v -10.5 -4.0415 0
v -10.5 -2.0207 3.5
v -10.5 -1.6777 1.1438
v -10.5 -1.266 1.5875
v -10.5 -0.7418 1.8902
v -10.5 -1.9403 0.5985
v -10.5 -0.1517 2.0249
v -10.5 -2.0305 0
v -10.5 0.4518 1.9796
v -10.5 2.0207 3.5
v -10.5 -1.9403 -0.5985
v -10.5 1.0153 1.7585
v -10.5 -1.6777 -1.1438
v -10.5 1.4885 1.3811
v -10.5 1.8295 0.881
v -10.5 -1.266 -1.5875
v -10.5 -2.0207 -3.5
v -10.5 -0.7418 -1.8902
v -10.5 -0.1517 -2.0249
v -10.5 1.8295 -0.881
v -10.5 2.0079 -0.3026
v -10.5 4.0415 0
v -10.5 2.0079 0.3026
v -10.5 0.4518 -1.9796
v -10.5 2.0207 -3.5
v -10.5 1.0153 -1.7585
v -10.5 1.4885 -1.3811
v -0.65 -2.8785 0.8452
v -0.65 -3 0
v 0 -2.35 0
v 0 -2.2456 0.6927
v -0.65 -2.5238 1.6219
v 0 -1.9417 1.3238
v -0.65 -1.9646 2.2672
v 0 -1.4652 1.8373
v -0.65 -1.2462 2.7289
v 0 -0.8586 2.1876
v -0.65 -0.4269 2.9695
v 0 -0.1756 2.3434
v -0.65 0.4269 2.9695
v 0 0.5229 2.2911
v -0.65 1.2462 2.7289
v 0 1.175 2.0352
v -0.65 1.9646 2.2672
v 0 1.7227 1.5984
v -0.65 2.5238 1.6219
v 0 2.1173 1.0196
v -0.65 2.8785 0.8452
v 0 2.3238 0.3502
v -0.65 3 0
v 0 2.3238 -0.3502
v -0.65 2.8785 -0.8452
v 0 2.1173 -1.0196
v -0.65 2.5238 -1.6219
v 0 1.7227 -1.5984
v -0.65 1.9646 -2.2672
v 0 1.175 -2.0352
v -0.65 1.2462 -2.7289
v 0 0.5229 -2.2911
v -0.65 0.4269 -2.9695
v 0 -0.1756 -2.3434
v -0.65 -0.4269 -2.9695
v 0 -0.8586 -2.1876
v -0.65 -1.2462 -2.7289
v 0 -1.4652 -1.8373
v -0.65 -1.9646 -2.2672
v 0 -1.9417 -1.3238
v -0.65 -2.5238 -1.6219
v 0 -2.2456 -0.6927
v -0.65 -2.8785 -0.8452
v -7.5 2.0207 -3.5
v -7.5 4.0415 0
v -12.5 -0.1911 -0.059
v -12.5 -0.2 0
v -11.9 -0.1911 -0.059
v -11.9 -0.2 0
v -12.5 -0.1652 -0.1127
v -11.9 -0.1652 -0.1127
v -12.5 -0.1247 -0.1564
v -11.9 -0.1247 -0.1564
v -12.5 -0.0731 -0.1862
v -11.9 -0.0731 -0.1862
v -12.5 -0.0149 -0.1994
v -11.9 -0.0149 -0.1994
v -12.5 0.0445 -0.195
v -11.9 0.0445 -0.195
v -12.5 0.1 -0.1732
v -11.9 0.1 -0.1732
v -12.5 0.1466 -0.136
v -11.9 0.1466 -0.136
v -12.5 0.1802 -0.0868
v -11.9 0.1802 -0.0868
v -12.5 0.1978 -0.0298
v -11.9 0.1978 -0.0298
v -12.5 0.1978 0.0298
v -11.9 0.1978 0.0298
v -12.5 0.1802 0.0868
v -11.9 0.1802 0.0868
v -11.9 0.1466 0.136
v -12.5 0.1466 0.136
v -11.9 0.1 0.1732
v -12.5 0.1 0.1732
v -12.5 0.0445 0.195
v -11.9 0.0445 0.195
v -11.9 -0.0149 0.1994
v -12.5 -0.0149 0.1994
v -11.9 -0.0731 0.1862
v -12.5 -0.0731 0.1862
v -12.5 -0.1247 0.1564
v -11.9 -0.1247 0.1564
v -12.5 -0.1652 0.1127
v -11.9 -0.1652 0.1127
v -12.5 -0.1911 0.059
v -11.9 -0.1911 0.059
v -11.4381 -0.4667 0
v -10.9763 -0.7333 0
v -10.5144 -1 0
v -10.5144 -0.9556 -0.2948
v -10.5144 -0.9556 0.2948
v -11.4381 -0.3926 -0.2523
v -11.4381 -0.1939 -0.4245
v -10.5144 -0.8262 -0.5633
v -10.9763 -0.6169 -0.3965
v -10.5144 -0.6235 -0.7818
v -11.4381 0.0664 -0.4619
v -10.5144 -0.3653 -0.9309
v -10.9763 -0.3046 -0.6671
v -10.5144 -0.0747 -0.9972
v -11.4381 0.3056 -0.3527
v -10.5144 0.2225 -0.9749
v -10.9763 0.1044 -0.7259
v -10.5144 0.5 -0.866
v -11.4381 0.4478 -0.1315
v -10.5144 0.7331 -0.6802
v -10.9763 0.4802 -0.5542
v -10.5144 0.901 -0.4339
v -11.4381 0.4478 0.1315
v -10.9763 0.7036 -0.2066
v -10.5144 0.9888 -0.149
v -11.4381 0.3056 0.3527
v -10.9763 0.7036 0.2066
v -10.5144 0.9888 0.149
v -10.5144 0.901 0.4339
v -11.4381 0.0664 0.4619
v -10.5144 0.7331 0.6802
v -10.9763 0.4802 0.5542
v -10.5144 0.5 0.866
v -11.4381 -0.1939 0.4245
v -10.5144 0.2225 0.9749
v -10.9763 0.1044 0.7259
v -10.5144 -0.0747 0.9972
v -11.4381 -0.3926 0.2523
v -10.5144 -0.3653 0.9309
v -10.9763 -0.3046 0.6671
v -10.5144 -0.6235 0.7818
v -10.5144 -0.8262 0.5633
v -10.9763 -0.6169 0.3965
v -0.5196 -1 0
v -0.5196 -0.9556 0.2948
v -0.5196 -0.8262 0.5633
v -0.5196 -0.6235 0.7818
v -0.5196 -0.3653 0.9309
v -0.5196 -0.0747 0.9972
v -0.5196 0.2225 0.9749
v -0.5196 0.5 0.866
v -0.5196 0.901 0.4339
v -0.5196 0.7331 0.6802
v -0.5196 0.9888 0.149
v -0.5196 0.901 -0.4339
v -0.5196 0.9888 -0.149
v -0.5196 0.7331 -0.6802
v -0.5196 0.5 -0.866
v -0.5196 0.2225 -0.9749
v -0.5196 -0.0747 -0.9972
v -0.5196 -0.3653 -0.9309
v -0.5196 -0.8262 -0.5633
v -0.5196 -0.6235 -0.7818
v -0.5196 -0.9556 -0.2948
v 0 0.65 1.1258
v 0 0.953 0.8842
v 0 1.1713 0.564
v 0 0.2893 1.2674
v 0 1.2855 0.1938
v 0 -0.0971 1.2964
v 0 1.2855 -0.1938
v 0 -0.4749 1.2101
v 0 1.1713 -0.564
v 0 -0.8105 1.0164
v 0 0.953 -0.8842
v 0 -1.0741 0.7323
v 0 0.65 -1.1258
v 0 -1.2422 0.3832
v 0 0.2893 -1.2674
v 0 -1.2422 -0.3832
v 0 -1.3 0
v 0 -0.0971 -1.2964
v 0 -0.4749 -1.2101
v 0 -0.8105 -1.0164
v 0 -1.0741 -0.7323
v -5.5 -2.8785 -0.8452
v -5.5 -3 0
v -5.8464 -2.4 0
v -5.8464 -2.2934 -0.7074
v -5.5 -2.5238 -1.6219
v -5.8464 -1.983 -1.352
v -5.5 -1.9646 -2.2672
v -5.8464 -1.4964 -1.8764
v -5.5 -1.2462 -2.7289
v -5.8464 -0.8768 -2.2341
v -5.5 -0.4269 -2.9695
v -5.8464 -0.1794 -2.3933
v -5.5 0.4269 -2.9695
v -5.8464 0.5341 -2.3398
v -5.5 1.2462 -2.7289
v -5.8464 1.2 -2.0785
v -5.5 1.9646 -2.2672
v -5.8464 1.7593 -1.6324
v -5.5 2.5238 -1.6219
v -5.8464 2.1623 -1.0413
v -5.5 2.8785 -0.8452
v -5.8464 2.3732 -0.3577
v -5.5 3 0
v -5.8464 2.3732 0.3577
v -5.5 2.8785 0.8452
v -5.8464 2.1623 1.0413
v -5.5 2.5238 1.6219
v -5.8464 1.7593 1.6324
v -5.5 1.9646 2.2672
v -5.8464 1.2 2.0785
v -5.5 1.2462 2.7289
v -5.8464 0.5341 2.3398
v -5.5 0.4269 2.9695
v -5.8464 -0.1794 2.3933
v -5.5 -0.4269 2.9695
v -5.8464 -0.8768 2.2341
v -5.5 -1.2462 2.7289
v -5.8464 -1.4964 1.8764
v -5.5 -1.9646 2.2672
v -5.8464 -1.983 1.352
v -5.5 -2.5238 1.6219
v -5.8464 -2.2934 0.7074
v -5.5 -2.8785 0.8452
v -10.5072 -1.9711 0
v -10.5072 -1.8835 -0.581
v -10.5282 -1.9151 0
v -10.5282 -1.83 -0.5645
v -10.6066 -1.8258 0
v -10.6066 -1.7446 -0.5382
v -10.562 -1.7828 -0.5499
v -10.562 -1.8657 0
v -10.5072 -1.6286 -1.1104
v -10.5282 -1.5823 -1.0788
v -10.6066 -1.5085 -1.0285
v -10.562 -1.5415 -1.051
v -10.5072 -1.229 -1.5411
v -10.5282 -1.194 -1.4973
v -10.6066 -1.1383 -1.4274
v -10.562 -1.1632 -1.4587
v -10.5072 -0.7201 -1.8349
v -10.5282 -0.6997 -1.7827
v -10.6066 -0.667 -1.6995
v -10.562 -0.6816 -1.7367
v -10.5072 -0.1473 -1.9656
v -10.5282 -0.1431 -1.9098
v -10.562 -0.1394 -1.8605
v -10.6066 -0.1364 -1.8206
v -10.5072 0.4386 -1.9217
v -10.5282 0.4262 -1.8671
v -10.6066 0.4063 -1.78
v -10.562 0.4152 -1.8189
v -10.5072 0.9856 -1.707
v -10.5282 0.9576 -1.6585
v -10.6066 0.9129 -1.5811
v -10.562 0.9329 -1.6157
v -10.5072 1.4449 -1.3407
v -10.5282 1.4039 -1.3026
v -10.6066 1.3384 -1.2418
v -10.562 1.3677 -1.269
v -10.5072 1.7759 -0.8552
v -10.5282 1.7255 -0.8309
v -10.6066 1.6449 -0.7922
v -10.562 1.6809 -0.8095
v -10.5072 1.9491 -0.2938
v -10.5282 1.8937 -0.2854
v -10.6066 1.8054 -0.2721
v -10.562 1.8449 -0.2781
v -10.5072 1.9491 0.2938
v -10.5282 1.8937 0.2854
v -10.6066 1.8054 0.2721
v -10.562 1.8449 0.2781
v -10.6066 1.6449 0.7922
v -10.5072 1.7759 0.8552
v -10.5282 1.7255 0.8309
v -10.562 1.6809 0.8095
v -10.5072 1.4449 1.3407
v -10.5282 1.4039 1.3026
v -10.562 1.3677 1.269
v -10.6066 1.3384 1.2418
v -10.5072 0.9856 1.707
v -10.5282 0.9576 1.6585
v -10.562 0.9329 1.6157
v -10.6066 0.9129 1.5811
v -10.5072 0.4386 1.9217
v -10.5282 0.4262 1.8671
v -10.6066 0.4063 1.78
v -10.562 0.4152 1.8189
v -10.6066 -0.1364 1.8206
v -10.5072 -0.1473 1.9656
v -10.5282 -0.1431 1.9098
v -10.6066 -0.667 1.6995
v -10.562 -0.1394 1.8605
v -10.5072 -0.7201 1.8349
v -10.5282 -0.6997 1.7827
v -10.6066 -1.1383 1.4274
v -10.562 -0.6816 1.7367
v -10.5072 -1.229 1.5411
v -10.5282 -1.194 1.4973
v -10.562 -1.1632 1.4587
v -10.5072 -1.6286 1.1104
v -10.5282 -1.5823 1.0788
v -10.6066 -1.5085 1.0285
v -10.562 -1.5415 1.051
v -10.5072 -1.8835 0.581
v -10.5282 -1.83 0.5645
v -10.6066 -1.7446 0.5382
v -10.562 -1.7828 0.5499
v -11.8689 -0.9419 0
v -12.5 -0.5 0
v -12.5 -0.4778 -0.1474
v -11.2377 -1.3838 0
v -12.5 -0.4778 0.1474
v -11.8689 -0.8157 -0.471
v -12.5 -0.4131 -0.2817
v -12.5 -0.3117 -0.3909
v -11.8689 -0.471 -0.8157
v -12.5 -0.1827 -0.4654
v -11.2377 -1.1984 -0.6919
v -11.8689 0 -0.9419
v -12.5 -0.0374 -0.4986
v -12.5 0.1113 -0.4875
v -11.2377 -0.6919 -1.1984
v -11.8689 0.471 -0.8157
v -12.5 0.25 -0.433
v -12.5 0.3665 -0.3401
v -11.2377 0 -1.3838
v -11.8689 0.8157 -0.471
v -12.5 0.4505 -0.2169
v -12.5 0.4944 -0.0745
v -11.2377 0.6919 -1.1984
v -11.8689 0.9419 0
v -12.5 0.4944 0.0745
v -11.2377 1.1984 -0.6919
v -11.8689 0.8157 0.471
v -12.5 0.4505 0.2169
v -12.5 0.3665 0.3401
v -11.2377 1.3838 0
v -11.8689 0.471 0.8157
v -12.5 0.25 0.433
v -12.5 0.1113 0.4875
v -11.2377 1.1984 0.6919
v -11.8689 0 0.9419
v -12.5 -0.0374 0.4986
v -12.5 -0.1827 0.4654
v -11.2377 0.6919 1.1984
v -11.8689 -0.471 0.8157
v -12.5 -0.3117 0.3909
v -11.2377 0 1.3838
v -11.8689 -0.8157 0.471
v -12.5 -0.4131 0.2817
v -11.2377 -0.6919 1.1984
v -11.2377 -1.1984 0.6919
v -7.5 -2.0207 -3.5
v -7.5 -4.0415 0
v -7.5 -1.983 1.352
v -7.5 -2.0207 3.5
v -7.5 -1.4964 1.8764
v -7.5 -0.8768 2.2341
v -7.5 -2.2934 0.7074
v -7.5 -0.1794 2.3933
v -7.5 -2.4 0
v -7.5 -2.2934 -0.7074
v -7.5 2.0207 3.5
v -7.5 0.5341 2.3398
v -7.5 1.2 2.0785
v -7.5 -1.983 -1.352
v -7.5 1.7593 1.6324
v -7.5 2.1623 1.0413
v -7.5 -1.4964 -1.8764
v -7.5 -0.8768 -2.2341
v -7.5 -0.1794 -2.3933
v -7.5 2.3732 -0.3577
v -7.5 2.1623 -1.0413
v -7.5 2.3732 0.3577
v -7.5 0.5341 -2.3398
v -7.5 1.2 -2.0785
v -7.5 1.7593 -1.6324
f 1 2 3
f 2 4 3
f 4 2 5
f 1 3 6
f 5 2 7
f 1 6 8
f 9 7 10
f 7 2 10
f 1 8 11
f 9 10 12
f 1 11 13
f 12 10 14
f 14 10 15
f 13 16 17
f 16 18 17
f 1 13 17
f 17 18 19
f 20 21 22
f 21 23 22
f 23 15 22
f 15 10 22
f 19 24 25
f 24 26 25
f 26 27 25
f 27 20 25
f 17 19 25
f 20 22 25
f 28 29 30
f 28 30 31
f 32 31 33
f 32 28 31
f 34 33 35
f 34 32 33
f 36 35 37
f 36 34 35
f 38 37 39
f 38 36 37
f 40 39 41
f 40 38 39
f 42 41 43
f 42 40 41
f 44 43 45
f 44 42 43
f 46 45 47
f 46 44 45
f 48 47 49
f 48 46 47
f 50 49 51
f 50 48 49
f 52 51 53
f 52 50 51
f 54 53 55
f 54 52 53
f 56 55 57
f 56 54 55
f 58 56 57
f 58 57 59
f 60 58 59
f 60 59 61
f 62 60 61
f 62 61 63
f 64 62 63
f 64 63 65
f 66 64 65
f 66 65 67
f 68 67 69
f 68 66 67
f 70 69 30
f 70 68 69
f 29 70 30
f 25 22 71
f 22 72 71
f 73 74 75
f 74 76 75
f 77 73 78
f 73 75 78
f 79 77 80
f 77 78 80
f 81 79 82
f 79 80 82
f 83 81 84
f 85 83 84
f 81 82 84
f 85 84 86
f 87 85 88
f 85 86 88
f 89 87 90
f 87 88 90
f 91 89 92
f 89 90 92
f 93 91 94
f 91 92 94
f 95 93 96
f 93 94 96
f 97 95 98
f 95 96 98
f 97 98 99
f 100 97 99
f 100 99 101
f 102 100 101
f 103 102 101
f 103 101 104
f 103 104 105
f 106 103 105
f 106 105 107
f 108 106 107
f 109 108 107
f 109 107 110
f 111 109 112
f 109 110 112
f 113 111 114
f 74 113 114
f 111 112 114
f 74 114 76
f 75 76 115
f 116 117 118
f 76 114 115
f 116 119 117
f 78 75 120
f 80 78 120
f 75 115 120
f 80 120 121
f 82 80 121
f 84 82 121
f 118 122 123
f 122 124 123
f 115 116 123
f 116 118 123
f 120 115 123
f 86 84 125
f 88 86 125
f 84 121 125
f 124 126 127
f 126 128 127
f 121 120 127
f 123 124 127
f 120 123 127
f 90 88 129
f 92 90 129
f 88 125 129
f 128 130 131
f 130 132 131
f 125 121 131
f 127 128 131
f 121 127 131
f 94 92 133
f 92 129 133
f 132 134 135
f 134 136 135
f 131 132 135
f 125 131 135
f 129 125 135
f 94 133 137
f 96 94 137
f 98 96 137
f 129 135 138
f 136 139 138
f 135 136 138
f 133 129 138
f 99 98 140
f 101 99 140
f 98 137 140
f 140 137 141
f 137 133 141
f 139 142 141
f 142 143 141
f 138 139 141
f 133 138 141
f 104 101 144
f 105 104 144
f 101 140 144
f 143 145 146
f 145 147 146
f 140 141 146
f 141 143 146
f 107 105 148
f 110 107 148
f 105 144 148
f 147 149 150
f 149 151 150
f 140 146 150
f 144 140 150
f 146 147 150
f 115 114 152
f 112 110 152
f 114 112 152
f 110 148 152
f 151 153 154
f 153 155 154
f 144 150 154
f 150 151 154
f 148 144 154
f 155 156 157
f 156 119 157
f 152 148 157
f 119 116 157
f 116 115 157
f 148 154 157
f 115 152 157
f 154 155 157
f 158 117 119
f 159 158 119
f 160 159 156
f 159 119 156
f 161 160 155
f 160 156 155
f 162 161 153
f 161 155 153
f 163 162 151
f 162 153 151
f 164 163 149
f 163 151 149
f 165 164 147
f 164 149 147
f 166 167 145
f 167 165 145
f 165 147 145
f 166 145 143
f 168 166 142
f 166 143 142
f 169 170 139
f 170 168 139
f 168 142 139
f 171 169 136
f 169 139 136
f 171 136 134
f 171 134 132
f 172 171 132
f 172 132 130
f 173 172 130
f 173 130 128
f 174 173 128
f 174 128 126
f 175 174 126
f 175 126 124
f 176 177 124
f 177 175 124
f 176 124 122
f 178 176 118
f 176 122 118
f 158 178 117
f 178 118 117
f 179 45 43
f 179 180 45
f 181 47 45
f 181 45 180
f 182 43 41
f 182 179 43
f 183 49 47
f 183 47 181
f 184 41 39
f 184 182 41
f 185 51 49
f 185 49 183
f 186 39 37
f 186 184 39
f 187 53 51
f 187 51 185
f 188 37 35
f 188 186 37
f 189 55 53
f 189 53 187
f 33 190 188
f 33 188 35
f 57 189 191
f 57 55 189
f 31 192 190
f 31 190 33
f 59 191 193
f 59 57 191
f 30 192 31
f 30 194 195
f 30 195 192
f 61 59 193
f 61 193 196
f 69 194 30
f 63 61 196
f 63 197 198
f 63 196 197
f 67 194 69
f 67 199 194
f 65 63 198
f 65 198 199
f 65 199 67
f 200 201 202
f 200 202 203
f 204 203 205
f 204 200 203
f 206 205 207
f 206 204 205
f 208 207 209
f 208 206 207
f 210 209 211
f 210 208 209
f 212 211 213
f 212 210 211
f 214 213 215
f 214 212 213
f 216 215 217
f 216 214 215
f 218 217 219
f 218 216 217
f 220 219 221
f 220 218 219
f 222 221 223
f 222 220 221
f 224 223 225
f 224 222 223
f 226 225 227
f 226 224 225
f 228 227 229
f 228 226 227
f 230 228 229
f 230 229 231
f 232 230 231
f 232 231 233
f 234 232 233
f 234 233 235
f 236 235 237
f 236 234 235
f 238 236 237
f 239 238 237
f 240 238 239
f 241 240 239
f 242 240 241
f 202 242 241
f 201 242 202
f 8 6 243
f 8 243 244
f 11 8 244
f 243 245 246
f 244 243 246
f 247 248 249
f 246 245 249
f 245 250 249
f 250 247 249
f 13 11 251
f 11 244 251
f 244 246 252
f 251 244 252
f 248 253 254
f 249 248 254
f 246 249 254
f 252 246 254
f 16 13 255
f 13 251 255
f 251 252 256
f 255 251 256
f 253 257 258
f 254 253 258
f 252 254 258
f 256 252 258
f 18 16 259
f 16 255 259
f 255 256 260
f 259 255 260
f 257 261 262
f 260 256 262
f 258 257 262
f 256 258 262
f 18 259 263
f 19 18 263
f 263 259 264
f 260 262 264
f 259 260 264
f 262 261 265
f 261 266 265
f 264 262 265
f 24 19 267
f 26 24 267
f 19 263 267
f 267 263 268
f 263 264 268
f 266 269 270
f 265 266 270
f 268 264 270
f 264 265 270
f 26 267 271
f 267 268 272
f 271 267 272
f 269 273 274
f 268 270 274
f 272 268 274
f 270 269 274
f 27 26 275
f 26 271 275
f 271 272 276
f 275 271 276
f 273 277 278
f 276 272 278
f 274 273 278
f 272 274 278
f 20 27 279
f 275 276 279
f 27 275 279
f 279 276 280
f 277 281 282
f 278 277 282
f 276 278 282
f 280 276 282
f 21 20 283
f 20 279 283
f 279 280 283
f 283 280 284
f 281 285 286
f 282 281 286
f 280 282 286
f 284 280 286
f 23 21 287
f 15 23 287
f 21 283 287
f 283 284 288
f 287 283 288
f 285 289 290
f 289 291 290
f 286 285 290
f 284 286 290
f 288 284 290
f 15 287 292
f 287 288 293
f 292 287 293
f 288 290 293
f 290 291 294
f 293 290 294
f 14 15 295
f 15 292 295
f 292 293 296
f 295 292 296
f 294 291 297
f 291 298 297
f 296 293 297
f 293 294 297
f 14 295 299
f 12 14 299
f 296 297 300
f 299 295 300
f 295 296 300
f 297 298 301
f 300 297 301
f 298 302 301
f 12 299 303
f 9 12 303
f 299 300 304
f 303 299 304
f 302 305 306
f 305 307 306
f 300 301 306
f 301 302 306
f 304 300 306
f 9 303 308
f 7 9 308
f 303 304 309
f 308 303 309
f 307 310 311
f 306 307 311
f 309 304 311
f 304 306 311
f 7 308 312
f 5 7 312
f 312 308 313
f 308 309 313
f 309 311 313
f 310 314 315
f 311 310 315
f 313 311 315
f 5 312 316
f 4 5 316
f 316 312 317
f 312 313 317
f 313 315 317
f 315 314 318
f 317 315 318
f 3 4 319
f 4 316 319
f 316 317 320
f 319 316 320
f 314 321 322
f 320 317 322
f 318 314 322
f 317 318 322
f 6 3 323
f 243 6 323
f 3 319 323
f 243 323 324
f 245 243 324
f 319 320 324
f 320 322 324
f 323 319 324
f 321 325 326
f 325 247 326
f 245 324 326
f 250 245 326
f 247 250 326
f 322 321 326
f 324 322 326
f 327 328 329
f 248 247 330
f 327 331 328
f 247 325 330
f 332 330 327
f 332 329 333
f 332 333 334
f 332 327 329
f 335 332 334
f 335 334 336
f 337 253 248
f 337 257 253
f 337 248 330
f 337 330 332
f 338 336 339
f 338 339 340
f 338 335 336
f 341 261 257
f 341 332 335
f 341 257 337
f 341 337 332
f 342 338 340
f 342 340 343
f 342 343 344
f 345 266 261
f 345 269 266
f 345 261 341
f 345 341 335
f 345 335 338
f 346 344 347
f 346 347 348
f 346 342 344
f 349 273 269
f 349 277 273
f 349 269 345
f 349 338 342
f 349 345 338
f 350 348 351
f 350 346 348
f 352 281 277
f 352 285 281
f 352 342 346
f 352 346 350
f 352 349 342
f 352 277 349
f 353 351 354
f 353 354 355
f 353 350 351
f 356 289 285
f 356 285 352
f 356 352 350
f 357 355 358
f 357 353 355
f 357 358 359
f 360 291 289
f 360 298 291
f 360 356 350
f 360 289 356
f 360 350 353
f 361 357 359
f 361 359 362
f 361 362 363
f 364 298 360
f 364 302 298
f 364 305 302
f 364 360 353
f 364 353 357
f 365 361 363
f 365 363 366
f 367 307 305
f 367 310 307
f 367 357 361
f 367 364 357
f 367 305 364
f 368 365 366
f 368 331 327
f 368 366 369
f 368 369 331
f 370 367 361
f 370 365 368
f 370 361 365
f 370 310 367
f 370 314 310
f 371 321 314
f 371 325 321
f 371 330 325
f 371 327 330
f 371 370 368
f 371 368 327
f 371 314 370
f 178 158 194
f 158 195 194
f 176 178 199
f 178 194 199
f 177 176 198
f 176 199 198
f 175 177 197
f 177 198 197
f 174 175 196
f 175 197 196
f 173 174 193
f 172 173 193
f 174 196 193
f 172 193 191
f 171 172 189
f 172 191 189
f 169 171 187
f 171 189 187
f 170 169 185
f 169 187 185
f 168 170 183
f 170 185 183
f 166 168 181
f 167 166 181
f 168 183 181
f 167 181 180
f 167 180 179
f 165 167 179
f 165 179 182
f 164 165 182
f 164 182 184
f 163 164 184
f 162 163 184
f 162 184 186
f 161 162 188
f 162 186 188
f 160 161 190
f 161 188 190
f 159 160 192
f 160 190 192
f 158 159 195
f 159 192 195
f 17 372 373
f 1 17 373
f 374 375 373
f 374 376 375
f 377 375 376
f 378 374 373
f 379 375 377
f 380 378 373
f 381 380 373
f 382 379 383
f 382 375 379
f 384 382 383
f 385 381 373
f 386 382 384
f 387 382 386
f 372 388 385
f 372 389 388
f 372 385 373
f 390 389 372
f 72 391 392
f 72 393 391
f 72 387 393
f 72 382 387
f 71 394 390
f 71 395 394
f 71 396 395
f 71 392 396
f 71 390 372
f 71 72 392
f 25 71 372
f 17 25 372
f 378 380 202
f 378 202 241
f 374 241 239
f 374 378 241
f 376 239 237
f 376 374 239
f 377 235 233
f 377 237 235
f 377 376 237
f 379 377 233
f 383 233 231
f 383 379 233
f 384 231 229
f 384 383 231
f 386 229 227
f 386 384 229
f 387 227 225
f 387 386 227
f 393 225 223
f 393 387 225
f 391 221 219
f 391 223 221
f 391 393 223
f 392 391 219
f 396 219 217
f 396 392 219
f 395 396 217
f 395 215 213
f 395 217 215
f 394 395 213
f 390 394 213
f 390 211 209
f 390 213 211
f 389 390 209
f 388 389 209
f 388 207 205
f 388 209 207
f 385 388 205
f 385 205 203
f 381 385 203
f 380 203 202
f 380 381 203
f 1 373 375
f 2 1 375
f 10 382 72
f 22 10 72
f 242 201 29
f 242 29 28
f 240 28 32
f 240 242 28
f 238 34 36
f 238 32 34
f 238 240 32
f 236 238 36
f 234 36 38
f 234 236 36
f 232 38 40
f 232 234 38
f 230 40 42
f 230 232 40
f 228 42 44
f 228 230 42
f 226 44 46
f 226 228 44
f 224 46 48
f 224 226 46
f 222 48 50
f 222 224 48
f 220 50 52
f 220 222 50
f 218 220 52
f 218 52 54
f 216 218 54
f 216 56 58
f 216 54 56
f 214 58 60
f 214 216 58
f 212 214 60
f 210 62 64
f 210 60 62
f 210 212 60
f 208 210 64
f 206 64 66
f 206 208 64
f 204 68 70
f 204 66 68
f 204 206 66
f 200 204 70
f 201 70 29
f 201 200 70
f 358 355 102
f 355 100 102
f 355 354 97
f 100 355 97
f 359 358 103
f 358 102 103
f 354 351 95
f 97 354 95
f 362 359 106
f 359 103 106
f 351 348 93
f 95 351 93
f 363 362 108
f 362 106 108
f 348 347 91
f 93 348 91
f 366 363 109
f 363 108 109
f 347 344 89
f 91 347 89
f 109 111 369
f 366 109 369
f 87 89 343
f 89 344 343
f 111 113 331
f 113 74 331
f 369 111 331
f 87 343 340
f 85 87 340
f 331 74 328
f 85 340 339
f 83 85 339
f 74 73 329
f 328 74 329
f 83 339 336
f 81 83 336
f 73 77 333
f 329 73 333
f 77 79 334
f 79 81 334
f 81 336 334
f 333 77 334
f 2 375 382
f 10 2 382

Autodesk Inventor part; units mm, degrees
ref_plane "YZ Plane" through (0, 0, 0) normal (1, 0, 0) x (0, 1, 0)
ref_plane "XZ Plane" through (0, 0, 0) normal (0, 1, 0) x (-1, 0, 0)
sketch "Náčrt1" plane through (0, 0, 0) normal (0, 0, 1) x (1, 0, 0)
  line L0 (0, -3.6) -> (0, 0.6) projected
  line L1 (-15, 0) -> (2.5, 0) projected
  line L2 (-0.5196, -1) -> (-10.5144, -1)
  line L3 (0, -1.3) -> (0, -3)
  line L4 (0, -3) -> (-5.5, -3)
  line L5 (-5.5, -3) -> (-6.1348, -1.9004)
  line L6 (-6.1348, -1.9004) -> (-10.5, -1.9004)
  line L7 (-10.5, -1.9004) -> (-12.5, -0.5)
  line L8 (-12.5, -0.5) -> (-12.5, -0.2)
  line L9 (-12.5, -0.2) -> (-11.9, -0.2)
  line L10 (-11.9, -0.2) -> (-10.5144, -1)
  line L11 (-0.5196, -1) -> (0, -1.3)
  line L12 (-5.8464, -2.4) -> (-7.5, -2.4)
  line L13 (-7.5, -2.4) -> (-7.5, -1.9004)
  point P0 (0, 0)
  dimension "d0" = 6
  dimension "d1" = 0.4
  dimension "d3" = 1
  dimension "d4" = 12.5
  dimension "d5" = 10.5
  dimension "d6" = 2
  dimension "d7" = 30
  dimension "d9" = 5.5
  dimension "d10" = 120
  dimension "d36" = 0.6
  dimension "d37" = 35
  dimension "d38" = 2.6
  dimension "d39" = 30
  dimension "d40" = 4.8
  dimension "d41" = 5
revolve "Rotace1" add sketch "Náčrt1" angle 360 about axis through (-10, 0, 0) along (1, 0, 0) contours L4 L5 L6 L7 L8 L9 L10 L2 L11 L0
ref_plane "Pracovní rovina1" through (-7.5, 0, 0) normal (1, 0, 0) x (0, 0, -1)
sketch "Náčrt2" plane through (-7.5, 0, 0) normal (1, 0, 0) x (0, 0, -1)
  line L0 (0, 4.0415) -> (3.5, 2.0207)
  line L1 (3.5, 2.0207) -> (3.5, -2.0207)
  line L2 (3.5, -2.0207) -> (0, -4.0415)
  line L3 (0, -4.0415) -> (-3.5, -2.0207)
  line L4 (-3.5, -2.0207) -> (-3.5, 2.0207)
  line L5 (-3.5, 2.0207) -> (0, 4.0415)
  circle A0 centre (0, 0) radius 1.9004 projected
  circle A1 centre (0, 0) radius 1.9004 projected
  dimension "d13" = 7
extrude "Vysunutí1" add sketch "Náčrt2" against normal blind 3
chamfer "Zkosení1" distance 0.65 angle 45 1 edges at (0, 3, 0)
thread "Závit1" size "M6x1" class "6g" standard "ANSI Metric M Profile" full length
fillet "Zaoblení1" radius 0.25 1 edges at (-10.5, 1.9004, 0)
sketch "Náčrt3" plane through (0, 0, 0) normal (0, 1, 0) x (-1, 0, 0)
  line L0 (7.5, 1.9004) -> (7.5, -1.9004) projected
  line L1 (7.5, 0) -> (7.5, -3.5) projected
  line L2 (7.5, 3.5) -> (7.5, 0) projected
  line L3 (7.5, 0) -> (7.5, 3.5) projected
  line L4 (7.5, -3.5) -> (7.5, 0) projected
  line L5 (10.5, 0) -> (10.5, -3.5) projected
  line L6 (10.5, -3.5) -> (10.5, 0) projected
  line L7 (10.5, 0) -> (10.5, 3.5) projected
  line L8 (10.5, 3.5) -> (10.5, 0) projected
  line L9 (10.5, -2.0306) -> (10.5, 2.0306) projected
  line L10 (7.5, 3.5) -> (10.5, 3.5) projected
  line L11 (7.5, 3.5) -> (10.5, 3.5) projected
  line L12 (12.6, 0) -> (-2.1, 0) projected
  line L13 (7.5, 3.625) -> (7.5, 4.5)
  line L14 (7.5, 4.5) -> (8.0052, 4.5)
  line L15 (8.0052, 4.5) -> (7.5, 3.625)
  line L16 (9, 3.5) -> (9, 2.759)
  line L17 (10.5, 3.625) -> (10.5, 4.5)
  line L18 (10.5, 4.5) -> (9.9948, 4.5)
  line L19 (9.9948, 4.5) -> (10.5, 3.625)
  point P0 (0, 0)
  dimension "d22" = 30
  dimension "d23" = 7.25
  dimension "d24" = 9
revolve "Rotace2" [suppressed]
sketch "Náčrt4" plane through (0, 0, 0) normal (0, 1, 0) x (-1, 0, 0)
  line L0 (7.5, 3.5) -> (10.5, 3.5) projected
  line L1 (9, 3.5) -> (9, 2.8)
  line L2 (9, 2.8) -> (8.8264, 2.8)
  line L3 (8.8264, 2.8) -> (8.5, 3.5)
  line L4 (9, 3.5) -> (8.5, 3.5)
  point P0 (0, 0)
  point P1 (7.7404, 3.5)
  point P2 (10.2596, 3.5)
  dimension "d26" = 25
  dimension "d27" = 1
  dimension "d28" = 0.7
revolve "Rotace3" [suppressed]
pattern_circular "Kruhové pole1" [suppressed]
revolve "Rotace4" add sketch "Náčrt1" angle 360 about axis through (-10, 0, 0) along (1, 0, 0) contours L12 L13 L6 L5
